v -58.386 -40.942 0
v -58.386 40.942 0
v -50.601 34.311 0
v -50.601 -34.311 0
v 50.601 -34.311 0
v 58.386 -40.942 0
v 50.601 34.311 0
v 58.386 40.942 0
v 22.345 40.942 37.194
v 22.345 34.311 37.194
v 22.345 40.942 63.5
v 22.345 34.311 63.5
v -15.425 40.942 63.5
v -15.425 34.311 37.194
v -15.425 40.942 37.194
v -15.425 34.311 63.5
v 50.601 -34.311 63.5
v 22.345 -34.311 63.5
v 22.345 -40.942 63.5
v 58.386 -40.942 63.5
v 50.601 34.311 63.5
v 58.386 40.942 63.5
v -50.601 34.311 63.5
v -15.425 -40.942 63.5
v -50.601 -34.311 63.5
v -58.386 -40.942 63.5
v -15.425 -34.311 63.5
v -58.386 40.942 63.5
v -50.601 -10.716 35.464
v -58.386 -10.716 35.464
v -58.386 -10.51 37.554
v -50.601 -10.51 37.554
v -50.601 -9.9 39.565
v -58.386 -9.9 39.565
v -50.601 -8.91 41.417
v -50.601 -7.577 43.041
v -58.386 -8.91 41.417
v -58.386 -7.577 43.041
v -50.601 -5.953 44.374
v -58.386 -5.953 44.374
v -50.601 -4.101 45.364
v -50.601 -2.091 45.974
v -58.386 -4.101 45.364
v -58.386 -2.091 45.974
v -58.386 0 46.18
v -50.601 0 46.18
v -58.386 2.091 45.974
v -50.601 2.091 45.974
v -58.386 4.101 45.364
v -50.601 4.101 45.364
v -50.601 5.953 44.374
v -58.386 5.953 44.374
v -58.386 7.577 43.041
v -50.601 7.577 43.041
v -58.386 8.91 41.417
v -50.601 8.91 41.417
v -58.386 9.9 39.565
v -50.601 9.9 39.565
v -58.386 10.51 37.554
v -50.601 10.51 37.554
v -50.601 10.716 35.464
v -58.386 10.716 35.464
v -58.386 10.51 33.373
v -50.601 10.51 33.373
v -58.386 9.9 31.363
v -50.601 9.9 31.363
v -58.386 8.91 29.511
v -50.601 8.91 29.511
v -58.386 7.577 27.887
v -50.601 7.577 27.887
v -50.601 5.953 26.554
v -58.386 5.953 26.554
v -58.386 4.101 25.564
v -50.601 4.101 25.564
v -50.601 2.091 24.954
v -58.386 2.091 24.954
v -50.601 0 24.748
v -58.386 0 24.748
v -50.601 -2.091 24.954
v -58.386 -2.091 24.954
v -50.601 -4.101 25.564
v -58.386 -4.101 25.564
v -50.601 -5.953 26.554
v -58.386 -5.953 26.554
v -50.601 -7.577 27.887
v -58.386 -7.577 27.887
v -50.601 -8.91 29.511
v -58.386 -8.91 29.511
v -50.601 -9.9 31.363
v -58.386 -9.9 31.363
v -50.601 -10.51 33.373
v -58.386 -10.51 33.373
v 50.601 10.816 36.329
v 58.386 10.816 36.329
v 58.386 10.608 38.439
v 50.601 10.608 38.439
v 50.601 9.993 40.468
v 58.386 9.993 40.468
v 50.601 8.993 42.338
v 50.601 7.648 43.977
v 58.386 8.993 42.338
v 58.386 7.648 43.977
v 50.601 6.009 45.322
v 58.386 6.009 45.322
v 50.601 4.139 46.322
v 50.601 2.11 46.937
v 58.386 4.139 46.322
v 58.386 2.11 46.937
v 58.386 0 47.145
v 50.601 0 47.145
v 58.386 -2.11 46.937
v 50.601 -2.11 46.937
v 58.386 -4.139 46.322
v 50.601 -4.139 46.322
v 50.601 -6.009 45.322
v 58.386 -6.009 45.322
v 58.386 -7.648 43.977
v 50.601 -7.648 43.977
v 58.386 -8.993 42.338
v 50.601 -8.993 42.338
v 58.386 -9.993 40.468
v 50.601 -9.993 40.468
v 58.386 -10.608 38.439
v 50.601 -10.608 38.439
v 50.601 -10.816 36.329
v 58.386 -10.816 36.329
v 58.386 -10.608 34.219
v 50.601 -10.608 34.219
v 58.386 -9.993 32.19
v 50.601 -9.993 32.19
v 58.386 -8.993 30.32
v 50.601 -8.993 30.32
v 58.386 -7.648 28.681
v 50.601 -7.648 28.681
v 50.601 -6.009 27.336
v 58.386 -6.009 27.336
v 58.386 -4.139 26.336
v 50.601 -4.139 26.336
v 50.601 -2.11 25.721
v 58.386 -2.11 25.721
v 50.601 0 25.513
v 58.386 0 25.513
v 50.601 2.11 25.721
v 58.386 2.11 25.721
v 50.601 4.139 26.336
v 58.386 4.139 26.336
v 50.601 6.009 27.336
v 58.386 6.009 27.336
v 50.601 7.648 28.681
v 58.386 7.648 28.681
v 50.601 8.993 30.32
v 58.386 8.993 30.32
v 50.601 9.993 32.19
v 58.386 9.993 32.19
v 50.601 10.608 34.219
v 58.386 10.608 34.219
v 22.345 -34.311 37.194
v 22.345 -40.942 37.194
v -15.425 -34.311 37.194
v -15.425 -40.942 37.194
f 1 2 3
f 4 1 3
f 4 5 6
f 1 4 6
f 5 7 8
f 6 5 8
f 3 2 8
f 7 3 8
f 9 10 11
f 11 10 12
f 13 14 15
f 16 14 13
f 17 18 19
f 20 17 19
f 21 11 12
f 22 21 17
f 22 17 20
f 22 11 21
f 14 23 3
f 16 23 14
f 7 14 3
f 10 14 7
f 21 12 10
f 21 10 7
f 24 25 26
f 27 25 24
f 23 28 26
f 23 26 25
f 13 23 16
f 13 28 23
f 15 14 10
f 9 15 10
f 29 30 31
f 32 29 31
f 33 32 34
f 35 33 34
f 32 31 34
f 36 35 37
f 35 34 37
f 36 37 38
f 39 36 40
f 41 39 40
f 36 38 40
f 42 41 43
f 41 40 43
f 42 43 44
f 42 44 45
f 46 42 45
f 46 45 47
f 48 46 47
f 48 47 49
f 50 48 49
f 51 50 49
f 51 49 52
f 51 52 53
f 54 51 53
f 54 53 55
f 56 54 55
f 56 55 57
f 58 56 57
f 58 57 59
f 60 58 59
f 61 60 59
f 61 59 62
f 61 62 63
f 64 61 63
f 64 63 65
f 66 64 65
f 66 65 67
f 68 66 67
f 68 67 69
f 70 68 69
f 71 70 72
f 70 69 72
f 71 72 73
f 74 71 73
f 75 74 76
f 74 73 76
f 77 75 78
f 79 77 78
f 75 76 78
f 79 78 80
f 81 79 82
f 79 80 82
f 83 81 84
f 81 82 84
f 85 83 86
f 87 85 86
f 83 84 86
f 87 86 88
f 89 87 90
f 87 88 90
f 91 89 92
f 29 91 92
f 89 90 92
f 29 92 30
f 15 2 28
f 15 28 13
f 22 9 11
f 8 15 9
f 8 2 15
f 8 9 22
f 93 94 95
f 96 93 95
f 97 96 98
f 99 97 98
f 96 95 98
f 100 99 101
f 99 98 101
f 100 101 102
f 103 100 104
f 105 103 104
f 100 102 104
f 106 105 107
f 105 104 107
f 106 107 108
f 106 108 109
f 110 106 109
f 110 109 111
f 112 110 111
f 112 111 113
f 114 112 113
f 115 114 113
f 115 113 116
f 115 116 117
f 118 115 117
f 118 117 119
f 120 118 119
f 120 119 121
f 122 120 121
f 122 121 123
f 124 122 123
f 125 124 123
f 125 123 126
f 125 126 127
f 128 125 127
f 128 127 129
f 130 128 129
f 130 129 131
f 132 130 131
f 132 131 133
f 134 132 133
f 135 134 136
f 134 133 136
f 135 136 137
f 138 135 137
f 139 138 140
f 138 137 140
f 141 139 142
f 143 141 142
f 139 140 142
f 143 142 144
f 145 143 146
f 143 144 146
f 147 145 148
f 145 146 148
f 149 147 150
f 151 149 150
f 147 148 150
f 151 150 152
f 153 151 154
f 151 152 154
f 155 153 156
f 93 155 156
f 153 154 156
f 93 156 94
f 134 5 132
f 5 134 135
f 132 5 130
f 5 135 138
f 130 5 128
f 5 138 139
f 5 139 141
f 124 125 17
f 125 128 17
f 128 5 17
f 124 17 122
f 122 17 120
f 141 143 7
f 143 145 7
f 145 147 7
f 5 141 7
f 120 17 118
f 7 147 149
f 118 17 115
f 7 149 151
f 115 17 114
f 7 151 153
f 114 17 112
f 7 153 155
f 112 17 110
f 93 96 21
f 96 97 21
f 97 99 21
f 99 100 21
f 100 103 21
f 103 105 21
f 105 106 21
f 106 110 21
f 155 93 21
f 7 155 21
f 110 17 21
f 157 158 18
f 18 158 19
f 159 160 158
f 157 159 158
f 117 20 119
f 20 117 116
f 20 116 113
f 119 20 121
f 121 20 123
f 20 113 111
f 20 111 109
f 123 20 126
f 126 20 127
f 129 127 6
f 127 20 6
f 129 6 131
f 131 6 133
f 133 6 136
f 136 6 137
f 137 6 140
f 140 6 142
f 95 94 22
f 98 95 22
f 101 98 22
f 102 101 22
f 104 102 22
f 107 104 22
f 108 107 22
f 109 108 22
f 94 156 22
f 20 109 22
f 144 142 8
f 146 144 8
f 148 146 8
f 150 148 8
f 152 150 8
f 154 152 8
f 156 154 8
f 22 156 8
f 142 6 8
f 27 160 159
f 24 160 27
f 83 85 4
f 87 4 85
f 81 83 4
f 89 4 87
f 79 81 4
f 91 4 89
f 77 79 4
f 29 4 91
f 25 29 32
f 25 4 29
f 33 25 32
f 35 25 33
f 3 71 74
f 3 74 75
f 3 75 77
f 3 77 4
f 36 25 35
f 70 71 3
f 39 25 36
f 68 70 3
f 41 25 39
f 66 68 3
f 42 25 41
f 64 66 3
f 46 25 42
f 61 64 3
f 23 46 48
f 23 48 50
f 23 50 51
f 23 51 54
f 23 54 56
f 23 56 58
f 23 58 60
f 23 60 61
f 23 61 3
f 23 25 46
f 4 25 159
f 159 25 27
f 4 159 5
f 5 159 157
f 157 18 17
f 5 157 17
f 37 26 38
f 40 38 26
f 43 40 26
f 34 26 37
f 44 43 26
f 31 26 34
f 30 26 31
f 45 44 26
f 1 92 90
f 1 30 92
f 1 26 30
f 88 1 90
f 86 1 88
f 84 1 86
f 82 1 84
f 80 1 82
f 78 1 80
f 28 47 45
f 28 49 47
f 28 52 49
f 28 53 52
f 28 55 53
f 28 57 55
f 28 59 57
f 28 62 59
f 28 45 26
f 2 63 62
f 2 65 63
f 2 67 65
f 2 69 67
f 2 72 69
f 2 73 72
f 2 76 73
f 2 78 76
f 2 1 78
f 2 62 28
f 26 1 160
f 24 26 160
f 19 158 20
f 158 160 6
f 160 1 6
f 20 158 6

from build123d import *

# Parameters (mm, degrees)
F0_W     = 116.7713552713
F0_H     = 81.8841084838
F1_DEPTH = 63.5
F2_W     = 101.201839745
F2_H     = 68.6211884022
F3_DEPTH = 76.2
F4_W     = 37.7704855055
F4_H     = 26.3061614931
F5_DEPTH = 101.6
F6_R     = 10.7156229068
F7_DEPTH = 101.6
F8_R     = 10.8160051842
F9_DEPTH = 101.6


with BuildPart() as f1:
    # F0 (on Top) → F1 (new body)
    with BuildSketch(Plane.XY):
        Rectangle(F0_W, F0_H)
    extrude(amount=F1_DEPTH)

    # F2 (on face) → F3 (cut)
    with BuildSketch(Plane.XY.offset(63.5)):
        Rectangle(F2_W, F2_H)
    extrude(amount=-F3_DEPTH, mode=Mode.SUBTRACT)

    # F4 (on face) → F5 (cut)
    with BuildSketch(Plane.XZ.offset(40.9420542419)):
        with Locations((3.4598903731, 50.3469192535)):
            Rectangle(F4_W, F4_H)
    extrude(amount=-F5_DEPTH, mode=Mode.SUBTRACT)

    # F6 (on face) → F7 (cut)
    with BuildSketch(Plane(origin=(-58.3856776357, 0, 0), x_dir=(0, -1, 0), z_dir=(-1, 0, 0))):
        with Locations((0, 35.4638919234)):
            Circle(F6_R)
    extrude(amount=-F7_DEPTH, mode=Mode.SUBTRACT)

    # F8 (on face) → F9 (cut)
    with BuildSketch(Plane.YZ.offset(58.3856776357)):
        with Locations((0, 36.3288670778)):
            Circle(F8_R)
    extrude(amount=-F9_DEPTH, mode=Mode.SUBTRACT)


solid = f1.part
